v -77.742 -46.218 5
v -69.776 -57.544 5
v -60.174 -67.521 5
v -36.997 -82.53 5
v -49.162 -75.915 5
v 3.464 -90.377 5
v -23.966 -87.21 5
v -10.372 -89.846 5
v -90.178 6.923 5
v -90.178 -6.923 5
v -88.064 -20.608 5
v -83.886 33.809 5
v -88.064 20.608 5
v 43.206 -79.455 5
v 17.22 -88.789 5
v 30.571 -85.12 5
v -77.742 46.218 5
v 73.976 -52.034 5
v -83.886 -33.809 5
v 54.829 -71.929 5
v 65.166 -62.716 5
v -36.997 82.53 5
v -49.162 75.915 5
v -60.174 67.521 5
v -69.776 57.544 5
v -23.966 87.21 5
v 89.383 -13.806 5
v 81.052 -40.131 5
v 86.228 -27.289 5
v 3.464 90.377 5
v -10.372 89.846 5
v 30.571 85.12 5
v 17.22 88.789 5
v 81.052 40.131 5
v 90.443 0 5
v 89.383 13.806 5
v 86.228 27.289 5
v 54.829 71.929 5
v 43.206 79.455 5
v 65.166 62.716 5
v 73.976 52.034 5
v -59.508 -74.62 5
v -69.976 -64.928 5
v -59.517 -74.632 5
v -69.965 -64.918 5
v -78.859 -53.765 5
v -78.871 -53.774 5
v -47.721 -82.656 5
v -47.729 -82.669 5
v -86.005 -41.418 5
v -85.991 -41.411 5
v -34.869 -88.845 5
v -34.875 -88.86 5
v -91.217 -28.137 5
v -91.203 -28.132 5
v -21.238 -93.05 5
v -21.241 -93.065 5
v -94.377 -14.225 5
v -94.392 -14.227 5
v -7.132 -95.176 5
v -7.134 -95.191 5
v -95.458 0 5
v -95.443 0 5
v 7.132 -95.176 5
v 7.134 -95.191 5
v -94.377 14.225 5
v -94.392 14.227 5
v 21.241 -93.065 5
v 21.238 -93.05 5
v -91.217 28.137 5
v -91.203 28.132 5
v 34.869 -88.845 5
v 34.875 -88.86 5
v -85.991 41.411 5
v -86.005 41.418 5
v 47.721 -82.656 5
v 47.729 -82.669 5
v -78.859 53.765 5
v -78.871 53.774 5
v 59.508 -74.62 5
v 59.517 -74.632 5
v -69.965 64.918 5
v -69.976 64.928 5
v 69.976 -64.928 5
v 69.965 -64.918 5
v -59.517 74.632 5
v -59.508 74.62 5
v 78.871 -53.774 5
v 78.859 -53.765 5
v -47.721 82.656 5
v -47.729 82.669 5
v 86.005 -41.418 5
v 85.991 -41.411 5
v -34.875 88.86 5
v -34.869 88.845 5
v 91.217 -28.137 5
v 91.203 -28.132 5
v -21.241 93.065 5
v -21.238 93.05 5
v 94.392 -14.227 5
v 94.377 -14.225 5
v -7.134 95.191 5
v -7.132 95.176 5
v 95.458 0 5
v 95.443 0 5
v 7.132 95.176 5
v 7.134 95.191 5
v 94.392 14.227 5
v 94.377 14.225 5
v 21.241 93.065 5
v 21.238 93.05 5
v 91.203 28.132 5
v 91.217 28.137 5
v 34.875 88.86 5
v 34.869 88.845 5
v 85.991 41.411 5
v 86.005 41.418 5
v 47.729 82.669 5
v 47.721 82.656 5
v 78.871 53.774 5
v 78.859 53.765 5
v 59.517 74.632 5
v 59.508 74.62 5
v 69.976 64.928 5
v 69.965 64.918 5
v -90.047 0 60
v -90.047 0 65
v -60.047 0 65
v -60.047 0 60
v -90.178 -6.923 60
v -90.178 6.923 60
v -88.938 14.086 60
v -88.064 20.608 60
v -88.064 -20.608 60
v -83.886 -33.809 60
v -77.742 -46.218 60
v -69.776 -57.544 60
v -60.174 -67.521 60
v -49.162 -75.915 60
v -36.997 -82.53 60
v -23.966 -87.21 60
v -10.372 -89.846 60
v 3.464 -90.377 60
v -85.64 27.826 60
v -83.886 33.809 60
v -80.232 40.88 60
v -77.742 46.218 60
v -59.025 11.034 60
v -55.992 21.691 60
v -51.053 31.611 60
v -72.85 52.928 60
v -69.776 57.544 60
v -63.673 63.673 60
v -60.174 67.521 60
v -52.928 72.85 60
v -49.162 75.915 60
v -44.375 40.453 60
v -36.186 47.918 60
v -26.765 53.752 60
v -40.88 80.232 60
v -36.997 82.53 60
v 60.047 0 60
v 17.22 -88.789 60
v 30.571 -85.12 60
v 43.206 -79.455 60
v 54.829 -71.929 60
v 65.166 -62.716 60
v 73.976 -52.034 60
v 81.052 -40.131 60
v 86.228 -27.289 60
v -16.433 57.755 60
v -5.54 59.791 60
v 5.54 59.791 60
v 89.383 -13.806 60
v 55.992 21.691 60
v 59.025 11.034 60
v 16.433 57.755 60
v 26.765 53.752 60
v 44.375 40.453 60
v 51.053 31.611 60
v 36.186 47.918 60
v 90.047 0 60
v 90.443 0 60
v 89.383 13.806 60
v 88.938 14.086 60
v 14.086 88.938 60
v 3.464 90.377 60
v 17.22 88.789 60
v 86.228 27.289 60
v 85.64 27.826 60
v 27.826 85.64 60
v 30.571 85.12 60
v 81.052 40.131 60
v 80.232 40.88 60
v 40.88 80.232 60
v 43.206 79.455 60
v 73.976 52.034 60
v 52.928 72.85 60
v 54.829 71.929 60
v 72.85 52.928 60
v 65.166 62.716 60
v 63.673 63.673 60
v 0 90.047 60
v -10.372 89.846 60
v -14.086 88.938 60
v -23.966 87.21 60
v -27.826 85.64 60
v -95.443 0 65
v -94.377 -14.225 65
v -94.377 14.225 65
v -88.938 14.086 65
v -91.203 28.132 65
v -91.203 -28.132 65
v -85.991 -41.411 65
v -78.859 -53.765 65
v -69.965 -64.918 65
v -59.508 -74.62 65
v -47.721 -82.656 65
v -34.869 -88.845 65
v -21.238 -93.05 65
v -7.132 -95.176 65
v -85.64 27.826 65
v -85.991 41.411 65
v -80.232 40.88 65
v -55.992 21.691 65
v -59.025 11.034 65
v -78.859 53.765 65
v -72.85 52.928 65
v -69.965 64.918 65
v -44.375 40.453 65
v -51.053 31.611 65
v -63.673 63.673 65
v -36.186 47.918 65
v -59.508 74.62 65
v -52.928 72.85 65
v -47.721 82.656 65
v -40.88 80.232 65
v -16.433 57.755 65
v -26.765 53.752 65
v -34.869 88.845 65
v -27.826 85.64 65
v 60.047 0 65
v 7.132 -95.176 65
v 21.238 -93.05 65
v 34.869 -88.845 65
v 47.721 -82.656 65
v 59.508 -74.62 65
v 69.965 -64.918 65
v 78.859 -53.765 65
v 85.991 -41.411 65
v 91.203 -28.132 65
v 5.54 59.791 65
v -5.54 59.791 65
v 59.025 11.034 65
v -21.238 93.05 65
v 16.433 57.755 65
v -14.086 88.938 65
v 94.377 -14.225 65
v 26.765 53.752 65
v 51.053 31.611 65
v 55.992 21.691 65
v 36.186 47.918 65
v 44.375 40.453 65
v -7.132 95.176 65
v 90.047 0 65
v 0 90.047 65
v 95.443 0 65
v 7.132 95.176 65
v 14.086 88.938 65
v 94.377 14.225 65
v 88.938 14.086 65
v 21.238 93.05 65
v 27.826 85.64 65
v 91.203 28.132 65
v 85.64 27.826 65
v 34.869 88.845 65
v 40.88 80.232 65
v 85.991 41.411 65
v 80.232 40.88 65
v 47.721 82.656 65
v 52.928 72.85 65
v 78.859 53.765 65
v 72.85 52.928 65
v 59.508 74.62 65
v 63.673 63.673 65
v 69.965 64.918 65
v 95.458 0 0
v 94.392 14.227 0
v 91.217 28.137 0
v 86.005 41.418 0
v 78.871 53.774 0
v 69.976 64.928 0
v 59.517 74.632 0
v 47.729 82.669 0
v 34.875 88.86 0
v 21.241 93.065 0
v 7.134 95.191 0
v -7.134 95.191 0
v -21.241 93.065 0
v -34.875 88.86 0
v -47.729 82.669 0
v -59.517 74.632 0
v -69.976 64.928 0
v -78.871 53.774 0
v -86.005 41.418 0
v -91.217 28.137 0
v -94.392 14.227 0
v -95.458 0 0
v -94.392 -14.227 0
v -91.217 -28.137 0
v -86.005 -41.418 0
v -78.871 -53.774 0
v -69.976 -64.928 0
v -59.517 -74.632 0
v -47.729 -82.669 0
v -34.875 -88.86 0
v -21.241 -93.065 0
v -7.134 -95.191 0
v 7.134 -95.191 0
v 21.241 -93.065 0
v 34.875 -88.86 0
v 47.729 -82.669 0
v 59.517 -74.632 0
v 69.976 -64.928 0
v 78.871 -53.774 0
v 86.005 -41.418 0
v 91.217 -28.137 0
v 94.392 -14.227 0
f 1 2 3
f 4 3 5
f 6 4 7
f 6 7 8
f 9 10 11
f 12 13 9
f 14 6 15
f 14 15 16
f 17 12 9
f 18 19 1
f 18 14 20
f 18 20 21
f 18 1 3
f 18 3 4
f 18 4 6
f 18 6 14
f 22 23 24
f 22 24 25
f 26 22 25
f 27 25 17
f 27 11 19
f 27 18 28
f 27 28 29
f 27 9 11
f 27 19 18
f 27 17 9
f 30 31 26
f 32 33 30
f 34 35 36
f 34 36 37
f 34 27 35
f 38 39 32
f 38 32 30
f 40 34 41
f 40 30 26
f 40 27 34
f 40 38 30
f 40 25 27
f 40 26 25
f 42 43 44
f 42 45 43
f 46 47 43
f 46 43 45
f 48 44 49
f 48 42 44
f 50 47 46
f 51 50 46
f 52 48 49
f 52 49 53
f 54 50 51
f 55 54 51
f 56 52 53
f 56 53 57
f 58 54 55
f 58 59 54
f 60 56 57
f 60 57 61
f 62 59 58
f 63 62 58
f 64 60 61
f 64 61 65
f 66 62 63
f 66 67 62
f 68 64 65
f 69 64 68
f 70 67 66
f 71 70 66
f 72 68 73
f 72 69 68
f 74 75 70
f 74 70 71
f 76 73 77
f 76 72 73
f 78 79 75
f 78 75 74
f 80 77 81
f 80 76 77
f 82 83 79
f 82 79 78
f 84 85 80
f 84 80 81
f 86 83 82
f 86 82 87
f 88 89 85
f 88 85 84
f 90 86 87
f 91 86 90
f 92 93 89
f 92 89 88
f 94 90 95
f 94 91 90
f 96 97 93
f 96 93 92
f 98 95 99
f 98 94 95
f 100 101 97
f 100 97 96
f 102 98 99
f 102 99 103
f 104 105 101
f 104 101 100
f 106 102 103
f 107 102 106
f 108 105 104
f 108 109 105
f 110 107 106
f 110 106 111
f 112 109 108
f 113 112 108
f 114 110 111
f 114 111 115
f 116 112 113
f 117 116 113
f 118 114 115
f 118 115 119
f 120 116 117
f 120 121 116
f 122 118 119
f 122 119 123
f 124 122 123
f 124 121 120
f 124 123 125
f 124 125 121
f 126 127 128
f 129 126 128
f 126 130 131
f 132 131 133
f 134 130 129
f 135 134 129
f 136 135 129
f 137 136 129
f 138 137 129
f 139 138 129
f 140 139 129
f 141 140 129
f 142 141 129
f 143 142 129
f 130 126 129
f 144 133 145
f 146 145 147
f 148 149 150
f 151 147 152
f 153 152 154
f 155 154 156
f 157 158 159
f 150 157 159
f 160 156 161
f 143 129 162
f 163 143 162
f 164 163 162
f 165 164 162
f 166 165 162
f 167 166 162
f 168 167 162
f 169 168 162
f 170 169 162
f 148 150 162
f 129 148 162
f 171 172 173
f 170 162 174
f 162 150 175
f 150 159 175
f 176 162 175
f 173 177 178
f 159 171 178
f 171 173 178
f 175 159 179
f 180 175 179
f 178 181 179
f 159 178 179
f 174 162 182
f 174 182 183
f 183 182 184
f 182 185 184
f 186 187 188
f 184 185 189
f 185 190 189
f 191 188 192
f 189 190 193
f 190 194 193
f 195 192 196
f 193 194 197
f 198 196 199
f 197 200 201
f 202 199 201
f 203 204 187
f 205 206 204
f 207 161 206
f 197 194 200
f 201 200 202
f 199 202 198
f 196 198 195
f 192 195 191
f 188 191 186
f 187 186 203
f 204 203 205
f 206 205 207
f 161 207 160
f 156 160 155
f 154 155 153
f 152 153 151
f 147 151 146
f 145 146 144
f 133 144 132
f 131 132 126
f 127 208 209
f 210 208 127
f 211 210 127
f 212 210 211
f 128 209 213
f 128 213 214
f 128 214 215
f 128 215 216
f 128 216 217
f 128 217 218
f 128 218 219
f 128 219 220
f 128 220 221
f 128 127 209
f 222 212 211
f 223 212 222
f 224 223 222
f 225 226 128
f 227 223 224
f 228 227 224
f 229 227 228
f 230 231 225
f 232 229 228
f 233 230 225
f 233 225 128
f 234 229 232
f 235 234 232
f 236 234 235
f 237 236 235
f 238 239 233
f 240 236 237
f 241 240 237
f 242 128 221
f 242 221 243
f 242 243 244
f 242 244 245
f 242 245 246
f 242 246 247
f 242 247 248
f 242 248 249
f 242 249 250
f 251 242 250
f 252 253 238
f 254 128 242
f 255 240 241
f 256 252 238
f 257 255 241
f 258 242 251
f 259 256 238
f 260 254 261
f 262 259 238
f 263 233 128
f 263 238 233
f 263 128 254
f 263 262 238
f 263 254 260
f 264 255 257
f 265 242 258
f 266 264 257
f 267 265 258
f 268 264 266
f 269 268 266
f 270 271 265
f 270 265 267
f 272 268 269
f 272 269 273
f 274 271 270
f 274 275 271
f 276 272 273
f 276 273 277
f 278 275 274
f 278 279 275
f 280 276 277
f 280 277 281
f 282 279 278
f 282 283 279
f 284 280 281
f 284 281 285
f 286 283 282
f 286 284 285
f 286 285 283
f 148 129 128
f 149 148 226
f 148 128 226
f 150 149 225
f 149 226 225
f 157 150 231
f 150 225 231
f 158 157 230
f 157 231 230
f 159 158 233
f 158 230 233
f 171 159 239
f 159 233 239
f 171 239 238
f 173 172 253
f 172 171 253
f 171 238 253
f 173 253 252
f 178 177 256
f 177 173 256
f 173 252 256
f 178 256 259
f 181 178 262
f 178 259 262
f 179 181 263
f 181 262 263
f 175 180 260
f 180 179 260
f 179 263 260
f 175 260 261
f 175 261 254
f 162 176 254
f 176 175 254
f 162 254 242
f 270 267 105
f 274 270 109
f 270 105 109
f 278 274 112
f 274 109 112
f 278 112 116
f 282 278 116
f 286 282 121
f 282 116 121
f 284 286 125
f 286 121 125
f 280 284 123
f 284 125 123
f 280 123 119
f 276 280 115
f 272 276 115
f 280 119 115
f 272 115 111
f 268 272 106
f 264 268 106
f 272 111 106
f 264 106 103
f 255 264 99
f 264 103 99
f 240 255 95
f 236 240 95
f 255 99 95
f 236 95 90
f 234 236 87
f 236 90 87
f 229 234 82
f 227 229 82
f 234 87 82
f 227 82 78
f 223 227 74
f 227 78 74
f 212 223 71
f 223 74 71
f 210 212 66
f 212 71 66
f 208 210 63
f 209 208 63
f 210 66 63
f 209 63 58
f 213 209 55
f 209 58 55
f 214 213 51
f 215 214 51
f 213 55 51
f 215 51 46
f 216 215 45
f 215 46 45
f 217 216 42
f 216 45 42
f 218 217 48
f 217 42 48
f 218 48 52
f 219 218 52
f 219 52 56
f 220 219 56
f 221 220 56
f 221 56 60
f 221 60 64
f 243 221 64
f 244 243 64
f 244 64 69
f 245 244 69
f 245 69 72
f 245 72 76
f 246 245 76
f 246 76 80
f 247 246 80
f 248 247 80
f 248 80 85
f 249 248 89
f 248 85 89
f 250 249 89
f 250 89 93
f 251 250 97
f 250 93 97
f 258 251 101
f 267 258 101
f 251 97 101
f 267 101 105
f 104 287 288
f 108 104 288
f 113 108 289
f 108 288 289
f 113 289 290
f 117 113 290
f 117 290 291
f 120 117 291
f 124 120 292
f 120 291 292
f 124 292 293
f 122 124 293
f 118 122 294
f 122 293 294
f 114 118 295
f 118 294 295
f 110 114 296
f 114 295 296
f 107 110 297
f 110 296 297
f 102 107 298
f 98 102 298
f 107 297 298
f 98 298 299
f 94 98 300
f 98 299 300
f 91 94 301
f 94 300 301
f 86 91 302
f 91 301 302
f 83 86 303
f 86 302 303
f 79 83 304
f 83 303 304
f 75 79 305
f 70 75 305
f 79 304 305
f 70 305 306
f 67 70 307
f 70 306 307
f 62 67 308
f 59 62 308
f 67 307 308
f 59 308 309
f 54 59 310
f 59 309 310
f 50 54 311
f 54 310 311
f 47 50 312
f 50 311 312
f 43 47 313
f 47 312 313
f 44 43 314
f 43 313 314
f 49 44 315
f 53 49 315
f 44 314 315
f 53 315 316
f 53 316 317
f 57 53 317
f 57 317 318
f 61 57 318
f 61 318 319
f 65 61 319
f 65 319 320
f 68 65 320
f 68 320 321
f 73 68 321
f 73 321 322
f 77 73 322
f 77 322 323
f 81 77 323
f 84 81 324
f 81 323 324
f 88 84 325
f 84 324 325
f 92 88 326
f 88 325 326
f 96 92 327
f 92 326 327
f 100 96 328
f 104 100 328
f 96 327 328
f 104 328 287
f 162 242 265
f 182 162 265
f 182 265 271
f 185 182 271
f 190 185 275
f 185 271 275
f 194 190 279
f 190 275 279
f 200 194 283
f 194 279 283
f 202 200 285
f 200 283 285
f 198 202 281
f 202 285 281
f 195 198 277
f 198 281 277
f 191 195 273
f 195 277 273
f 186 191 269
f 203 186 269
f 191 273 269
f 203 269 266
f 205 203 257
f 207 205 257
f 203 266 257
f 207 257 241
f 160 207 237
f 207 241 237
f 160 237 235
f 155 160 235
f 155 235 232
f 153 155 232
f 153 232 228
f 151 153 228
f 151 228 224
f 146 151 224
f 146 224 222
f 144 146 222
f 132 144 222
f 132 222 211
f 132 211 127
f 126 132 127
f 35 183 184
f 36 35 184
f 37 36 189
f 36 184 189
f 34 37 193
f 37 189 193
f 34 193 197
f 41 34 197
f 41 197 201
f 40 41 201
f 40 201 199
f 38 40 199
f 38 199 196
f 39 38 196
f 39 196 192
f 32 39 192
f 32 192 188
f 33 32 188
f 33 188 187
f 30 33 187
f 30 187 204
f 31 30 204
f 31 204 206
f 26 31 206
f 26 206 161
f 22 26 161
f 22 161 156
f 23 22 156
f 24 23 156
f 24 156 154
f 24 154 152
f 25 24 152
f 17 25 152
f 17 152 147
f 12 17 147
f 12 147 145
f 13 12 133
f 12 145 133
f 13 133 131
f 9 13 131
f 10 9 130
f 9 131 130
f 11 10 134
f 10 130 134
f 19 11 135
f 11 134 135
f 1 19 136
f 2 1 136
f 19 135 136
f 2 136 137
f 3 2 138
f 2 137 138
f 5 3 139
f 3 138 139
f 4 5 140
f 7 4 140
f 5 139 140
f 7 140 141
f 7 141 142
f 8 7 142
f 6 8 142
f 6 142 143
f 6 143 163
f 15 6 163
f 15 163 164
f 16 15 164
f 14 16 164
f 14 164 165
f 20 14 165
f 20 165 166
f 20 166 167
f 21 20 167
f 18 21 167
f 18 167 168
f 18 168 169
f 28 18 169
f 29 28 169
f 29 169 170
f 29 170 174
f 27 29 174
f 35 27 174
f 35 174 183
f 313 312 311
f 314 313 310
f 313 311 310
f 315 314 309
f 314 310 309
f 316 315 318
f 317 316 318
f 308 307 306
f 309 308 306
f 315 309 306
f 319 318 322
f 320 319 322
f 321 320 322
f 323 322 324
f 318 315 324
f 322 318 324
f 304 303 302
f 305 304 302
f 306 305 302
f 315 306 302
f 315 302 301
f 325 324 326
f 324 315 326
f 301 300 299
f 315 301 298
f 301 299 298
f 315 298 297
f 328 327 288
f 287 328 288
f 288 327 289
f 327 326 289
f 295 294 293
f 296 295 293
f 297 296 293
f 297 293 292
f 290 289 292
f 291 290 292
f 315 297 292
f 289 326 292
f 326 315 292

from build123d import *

# Parameters (mm, degrees)
F0_R      = 95.443
F1_DEPTH  = 60
F3_R      = 90.443
F4_DEPTH  = 147
F5_R      = 95.443
F6_DEPTH  = 5
F7_R      = 95.458283
F8_DEPTH  = 5
F11_DEPTH = 25


with BuildPart() as f1:
    # F0 (on Top) → F1 (new body)
    with BuildSketch(Plane.XY):
        Circle(F0_R)
    extrude(amount=F1_DEPTH)

    # F3 (on offset) → F4 (cut)
    with BuildSketch(Plane.XY.offset(60)):
        Circle(F3_R)
    extrude(amount=-F4_DEPTH, mode=Mode.SUBTRACT)

    # F5 (on offset) → F6 (join)
    with BuildSketch(Plane.XY.offset(60)):
        Circle(F5_R)
    extrude(amount=F6_DEPTH)

    # F7 (on Top) → F8 (join)
    with BuildSketch(Plane.XY):
        Circle(F7_R)
    extrude(amount=F8_DEPTH)

    # F10 (on offset) → F11 (cut)
    with BuildSketch(Plane.XY.offset(65)):
        with BuildLine():
            ThreePointArc((90.046942, 0), (0, 90.046942), (-90.046942, 0))
            Line((-90.046942, 0), (-60.046942, 0))
            ThreePointArc((-60.046942, 0), (0, 60.046942), (60.046942, 0))
            Line((60.046942, 0), (90.046942, 0))
        make_face()
    extrude(amount=-F11_DEPTH, mode=Mode.SUBTRACT)


solid = f1.part
